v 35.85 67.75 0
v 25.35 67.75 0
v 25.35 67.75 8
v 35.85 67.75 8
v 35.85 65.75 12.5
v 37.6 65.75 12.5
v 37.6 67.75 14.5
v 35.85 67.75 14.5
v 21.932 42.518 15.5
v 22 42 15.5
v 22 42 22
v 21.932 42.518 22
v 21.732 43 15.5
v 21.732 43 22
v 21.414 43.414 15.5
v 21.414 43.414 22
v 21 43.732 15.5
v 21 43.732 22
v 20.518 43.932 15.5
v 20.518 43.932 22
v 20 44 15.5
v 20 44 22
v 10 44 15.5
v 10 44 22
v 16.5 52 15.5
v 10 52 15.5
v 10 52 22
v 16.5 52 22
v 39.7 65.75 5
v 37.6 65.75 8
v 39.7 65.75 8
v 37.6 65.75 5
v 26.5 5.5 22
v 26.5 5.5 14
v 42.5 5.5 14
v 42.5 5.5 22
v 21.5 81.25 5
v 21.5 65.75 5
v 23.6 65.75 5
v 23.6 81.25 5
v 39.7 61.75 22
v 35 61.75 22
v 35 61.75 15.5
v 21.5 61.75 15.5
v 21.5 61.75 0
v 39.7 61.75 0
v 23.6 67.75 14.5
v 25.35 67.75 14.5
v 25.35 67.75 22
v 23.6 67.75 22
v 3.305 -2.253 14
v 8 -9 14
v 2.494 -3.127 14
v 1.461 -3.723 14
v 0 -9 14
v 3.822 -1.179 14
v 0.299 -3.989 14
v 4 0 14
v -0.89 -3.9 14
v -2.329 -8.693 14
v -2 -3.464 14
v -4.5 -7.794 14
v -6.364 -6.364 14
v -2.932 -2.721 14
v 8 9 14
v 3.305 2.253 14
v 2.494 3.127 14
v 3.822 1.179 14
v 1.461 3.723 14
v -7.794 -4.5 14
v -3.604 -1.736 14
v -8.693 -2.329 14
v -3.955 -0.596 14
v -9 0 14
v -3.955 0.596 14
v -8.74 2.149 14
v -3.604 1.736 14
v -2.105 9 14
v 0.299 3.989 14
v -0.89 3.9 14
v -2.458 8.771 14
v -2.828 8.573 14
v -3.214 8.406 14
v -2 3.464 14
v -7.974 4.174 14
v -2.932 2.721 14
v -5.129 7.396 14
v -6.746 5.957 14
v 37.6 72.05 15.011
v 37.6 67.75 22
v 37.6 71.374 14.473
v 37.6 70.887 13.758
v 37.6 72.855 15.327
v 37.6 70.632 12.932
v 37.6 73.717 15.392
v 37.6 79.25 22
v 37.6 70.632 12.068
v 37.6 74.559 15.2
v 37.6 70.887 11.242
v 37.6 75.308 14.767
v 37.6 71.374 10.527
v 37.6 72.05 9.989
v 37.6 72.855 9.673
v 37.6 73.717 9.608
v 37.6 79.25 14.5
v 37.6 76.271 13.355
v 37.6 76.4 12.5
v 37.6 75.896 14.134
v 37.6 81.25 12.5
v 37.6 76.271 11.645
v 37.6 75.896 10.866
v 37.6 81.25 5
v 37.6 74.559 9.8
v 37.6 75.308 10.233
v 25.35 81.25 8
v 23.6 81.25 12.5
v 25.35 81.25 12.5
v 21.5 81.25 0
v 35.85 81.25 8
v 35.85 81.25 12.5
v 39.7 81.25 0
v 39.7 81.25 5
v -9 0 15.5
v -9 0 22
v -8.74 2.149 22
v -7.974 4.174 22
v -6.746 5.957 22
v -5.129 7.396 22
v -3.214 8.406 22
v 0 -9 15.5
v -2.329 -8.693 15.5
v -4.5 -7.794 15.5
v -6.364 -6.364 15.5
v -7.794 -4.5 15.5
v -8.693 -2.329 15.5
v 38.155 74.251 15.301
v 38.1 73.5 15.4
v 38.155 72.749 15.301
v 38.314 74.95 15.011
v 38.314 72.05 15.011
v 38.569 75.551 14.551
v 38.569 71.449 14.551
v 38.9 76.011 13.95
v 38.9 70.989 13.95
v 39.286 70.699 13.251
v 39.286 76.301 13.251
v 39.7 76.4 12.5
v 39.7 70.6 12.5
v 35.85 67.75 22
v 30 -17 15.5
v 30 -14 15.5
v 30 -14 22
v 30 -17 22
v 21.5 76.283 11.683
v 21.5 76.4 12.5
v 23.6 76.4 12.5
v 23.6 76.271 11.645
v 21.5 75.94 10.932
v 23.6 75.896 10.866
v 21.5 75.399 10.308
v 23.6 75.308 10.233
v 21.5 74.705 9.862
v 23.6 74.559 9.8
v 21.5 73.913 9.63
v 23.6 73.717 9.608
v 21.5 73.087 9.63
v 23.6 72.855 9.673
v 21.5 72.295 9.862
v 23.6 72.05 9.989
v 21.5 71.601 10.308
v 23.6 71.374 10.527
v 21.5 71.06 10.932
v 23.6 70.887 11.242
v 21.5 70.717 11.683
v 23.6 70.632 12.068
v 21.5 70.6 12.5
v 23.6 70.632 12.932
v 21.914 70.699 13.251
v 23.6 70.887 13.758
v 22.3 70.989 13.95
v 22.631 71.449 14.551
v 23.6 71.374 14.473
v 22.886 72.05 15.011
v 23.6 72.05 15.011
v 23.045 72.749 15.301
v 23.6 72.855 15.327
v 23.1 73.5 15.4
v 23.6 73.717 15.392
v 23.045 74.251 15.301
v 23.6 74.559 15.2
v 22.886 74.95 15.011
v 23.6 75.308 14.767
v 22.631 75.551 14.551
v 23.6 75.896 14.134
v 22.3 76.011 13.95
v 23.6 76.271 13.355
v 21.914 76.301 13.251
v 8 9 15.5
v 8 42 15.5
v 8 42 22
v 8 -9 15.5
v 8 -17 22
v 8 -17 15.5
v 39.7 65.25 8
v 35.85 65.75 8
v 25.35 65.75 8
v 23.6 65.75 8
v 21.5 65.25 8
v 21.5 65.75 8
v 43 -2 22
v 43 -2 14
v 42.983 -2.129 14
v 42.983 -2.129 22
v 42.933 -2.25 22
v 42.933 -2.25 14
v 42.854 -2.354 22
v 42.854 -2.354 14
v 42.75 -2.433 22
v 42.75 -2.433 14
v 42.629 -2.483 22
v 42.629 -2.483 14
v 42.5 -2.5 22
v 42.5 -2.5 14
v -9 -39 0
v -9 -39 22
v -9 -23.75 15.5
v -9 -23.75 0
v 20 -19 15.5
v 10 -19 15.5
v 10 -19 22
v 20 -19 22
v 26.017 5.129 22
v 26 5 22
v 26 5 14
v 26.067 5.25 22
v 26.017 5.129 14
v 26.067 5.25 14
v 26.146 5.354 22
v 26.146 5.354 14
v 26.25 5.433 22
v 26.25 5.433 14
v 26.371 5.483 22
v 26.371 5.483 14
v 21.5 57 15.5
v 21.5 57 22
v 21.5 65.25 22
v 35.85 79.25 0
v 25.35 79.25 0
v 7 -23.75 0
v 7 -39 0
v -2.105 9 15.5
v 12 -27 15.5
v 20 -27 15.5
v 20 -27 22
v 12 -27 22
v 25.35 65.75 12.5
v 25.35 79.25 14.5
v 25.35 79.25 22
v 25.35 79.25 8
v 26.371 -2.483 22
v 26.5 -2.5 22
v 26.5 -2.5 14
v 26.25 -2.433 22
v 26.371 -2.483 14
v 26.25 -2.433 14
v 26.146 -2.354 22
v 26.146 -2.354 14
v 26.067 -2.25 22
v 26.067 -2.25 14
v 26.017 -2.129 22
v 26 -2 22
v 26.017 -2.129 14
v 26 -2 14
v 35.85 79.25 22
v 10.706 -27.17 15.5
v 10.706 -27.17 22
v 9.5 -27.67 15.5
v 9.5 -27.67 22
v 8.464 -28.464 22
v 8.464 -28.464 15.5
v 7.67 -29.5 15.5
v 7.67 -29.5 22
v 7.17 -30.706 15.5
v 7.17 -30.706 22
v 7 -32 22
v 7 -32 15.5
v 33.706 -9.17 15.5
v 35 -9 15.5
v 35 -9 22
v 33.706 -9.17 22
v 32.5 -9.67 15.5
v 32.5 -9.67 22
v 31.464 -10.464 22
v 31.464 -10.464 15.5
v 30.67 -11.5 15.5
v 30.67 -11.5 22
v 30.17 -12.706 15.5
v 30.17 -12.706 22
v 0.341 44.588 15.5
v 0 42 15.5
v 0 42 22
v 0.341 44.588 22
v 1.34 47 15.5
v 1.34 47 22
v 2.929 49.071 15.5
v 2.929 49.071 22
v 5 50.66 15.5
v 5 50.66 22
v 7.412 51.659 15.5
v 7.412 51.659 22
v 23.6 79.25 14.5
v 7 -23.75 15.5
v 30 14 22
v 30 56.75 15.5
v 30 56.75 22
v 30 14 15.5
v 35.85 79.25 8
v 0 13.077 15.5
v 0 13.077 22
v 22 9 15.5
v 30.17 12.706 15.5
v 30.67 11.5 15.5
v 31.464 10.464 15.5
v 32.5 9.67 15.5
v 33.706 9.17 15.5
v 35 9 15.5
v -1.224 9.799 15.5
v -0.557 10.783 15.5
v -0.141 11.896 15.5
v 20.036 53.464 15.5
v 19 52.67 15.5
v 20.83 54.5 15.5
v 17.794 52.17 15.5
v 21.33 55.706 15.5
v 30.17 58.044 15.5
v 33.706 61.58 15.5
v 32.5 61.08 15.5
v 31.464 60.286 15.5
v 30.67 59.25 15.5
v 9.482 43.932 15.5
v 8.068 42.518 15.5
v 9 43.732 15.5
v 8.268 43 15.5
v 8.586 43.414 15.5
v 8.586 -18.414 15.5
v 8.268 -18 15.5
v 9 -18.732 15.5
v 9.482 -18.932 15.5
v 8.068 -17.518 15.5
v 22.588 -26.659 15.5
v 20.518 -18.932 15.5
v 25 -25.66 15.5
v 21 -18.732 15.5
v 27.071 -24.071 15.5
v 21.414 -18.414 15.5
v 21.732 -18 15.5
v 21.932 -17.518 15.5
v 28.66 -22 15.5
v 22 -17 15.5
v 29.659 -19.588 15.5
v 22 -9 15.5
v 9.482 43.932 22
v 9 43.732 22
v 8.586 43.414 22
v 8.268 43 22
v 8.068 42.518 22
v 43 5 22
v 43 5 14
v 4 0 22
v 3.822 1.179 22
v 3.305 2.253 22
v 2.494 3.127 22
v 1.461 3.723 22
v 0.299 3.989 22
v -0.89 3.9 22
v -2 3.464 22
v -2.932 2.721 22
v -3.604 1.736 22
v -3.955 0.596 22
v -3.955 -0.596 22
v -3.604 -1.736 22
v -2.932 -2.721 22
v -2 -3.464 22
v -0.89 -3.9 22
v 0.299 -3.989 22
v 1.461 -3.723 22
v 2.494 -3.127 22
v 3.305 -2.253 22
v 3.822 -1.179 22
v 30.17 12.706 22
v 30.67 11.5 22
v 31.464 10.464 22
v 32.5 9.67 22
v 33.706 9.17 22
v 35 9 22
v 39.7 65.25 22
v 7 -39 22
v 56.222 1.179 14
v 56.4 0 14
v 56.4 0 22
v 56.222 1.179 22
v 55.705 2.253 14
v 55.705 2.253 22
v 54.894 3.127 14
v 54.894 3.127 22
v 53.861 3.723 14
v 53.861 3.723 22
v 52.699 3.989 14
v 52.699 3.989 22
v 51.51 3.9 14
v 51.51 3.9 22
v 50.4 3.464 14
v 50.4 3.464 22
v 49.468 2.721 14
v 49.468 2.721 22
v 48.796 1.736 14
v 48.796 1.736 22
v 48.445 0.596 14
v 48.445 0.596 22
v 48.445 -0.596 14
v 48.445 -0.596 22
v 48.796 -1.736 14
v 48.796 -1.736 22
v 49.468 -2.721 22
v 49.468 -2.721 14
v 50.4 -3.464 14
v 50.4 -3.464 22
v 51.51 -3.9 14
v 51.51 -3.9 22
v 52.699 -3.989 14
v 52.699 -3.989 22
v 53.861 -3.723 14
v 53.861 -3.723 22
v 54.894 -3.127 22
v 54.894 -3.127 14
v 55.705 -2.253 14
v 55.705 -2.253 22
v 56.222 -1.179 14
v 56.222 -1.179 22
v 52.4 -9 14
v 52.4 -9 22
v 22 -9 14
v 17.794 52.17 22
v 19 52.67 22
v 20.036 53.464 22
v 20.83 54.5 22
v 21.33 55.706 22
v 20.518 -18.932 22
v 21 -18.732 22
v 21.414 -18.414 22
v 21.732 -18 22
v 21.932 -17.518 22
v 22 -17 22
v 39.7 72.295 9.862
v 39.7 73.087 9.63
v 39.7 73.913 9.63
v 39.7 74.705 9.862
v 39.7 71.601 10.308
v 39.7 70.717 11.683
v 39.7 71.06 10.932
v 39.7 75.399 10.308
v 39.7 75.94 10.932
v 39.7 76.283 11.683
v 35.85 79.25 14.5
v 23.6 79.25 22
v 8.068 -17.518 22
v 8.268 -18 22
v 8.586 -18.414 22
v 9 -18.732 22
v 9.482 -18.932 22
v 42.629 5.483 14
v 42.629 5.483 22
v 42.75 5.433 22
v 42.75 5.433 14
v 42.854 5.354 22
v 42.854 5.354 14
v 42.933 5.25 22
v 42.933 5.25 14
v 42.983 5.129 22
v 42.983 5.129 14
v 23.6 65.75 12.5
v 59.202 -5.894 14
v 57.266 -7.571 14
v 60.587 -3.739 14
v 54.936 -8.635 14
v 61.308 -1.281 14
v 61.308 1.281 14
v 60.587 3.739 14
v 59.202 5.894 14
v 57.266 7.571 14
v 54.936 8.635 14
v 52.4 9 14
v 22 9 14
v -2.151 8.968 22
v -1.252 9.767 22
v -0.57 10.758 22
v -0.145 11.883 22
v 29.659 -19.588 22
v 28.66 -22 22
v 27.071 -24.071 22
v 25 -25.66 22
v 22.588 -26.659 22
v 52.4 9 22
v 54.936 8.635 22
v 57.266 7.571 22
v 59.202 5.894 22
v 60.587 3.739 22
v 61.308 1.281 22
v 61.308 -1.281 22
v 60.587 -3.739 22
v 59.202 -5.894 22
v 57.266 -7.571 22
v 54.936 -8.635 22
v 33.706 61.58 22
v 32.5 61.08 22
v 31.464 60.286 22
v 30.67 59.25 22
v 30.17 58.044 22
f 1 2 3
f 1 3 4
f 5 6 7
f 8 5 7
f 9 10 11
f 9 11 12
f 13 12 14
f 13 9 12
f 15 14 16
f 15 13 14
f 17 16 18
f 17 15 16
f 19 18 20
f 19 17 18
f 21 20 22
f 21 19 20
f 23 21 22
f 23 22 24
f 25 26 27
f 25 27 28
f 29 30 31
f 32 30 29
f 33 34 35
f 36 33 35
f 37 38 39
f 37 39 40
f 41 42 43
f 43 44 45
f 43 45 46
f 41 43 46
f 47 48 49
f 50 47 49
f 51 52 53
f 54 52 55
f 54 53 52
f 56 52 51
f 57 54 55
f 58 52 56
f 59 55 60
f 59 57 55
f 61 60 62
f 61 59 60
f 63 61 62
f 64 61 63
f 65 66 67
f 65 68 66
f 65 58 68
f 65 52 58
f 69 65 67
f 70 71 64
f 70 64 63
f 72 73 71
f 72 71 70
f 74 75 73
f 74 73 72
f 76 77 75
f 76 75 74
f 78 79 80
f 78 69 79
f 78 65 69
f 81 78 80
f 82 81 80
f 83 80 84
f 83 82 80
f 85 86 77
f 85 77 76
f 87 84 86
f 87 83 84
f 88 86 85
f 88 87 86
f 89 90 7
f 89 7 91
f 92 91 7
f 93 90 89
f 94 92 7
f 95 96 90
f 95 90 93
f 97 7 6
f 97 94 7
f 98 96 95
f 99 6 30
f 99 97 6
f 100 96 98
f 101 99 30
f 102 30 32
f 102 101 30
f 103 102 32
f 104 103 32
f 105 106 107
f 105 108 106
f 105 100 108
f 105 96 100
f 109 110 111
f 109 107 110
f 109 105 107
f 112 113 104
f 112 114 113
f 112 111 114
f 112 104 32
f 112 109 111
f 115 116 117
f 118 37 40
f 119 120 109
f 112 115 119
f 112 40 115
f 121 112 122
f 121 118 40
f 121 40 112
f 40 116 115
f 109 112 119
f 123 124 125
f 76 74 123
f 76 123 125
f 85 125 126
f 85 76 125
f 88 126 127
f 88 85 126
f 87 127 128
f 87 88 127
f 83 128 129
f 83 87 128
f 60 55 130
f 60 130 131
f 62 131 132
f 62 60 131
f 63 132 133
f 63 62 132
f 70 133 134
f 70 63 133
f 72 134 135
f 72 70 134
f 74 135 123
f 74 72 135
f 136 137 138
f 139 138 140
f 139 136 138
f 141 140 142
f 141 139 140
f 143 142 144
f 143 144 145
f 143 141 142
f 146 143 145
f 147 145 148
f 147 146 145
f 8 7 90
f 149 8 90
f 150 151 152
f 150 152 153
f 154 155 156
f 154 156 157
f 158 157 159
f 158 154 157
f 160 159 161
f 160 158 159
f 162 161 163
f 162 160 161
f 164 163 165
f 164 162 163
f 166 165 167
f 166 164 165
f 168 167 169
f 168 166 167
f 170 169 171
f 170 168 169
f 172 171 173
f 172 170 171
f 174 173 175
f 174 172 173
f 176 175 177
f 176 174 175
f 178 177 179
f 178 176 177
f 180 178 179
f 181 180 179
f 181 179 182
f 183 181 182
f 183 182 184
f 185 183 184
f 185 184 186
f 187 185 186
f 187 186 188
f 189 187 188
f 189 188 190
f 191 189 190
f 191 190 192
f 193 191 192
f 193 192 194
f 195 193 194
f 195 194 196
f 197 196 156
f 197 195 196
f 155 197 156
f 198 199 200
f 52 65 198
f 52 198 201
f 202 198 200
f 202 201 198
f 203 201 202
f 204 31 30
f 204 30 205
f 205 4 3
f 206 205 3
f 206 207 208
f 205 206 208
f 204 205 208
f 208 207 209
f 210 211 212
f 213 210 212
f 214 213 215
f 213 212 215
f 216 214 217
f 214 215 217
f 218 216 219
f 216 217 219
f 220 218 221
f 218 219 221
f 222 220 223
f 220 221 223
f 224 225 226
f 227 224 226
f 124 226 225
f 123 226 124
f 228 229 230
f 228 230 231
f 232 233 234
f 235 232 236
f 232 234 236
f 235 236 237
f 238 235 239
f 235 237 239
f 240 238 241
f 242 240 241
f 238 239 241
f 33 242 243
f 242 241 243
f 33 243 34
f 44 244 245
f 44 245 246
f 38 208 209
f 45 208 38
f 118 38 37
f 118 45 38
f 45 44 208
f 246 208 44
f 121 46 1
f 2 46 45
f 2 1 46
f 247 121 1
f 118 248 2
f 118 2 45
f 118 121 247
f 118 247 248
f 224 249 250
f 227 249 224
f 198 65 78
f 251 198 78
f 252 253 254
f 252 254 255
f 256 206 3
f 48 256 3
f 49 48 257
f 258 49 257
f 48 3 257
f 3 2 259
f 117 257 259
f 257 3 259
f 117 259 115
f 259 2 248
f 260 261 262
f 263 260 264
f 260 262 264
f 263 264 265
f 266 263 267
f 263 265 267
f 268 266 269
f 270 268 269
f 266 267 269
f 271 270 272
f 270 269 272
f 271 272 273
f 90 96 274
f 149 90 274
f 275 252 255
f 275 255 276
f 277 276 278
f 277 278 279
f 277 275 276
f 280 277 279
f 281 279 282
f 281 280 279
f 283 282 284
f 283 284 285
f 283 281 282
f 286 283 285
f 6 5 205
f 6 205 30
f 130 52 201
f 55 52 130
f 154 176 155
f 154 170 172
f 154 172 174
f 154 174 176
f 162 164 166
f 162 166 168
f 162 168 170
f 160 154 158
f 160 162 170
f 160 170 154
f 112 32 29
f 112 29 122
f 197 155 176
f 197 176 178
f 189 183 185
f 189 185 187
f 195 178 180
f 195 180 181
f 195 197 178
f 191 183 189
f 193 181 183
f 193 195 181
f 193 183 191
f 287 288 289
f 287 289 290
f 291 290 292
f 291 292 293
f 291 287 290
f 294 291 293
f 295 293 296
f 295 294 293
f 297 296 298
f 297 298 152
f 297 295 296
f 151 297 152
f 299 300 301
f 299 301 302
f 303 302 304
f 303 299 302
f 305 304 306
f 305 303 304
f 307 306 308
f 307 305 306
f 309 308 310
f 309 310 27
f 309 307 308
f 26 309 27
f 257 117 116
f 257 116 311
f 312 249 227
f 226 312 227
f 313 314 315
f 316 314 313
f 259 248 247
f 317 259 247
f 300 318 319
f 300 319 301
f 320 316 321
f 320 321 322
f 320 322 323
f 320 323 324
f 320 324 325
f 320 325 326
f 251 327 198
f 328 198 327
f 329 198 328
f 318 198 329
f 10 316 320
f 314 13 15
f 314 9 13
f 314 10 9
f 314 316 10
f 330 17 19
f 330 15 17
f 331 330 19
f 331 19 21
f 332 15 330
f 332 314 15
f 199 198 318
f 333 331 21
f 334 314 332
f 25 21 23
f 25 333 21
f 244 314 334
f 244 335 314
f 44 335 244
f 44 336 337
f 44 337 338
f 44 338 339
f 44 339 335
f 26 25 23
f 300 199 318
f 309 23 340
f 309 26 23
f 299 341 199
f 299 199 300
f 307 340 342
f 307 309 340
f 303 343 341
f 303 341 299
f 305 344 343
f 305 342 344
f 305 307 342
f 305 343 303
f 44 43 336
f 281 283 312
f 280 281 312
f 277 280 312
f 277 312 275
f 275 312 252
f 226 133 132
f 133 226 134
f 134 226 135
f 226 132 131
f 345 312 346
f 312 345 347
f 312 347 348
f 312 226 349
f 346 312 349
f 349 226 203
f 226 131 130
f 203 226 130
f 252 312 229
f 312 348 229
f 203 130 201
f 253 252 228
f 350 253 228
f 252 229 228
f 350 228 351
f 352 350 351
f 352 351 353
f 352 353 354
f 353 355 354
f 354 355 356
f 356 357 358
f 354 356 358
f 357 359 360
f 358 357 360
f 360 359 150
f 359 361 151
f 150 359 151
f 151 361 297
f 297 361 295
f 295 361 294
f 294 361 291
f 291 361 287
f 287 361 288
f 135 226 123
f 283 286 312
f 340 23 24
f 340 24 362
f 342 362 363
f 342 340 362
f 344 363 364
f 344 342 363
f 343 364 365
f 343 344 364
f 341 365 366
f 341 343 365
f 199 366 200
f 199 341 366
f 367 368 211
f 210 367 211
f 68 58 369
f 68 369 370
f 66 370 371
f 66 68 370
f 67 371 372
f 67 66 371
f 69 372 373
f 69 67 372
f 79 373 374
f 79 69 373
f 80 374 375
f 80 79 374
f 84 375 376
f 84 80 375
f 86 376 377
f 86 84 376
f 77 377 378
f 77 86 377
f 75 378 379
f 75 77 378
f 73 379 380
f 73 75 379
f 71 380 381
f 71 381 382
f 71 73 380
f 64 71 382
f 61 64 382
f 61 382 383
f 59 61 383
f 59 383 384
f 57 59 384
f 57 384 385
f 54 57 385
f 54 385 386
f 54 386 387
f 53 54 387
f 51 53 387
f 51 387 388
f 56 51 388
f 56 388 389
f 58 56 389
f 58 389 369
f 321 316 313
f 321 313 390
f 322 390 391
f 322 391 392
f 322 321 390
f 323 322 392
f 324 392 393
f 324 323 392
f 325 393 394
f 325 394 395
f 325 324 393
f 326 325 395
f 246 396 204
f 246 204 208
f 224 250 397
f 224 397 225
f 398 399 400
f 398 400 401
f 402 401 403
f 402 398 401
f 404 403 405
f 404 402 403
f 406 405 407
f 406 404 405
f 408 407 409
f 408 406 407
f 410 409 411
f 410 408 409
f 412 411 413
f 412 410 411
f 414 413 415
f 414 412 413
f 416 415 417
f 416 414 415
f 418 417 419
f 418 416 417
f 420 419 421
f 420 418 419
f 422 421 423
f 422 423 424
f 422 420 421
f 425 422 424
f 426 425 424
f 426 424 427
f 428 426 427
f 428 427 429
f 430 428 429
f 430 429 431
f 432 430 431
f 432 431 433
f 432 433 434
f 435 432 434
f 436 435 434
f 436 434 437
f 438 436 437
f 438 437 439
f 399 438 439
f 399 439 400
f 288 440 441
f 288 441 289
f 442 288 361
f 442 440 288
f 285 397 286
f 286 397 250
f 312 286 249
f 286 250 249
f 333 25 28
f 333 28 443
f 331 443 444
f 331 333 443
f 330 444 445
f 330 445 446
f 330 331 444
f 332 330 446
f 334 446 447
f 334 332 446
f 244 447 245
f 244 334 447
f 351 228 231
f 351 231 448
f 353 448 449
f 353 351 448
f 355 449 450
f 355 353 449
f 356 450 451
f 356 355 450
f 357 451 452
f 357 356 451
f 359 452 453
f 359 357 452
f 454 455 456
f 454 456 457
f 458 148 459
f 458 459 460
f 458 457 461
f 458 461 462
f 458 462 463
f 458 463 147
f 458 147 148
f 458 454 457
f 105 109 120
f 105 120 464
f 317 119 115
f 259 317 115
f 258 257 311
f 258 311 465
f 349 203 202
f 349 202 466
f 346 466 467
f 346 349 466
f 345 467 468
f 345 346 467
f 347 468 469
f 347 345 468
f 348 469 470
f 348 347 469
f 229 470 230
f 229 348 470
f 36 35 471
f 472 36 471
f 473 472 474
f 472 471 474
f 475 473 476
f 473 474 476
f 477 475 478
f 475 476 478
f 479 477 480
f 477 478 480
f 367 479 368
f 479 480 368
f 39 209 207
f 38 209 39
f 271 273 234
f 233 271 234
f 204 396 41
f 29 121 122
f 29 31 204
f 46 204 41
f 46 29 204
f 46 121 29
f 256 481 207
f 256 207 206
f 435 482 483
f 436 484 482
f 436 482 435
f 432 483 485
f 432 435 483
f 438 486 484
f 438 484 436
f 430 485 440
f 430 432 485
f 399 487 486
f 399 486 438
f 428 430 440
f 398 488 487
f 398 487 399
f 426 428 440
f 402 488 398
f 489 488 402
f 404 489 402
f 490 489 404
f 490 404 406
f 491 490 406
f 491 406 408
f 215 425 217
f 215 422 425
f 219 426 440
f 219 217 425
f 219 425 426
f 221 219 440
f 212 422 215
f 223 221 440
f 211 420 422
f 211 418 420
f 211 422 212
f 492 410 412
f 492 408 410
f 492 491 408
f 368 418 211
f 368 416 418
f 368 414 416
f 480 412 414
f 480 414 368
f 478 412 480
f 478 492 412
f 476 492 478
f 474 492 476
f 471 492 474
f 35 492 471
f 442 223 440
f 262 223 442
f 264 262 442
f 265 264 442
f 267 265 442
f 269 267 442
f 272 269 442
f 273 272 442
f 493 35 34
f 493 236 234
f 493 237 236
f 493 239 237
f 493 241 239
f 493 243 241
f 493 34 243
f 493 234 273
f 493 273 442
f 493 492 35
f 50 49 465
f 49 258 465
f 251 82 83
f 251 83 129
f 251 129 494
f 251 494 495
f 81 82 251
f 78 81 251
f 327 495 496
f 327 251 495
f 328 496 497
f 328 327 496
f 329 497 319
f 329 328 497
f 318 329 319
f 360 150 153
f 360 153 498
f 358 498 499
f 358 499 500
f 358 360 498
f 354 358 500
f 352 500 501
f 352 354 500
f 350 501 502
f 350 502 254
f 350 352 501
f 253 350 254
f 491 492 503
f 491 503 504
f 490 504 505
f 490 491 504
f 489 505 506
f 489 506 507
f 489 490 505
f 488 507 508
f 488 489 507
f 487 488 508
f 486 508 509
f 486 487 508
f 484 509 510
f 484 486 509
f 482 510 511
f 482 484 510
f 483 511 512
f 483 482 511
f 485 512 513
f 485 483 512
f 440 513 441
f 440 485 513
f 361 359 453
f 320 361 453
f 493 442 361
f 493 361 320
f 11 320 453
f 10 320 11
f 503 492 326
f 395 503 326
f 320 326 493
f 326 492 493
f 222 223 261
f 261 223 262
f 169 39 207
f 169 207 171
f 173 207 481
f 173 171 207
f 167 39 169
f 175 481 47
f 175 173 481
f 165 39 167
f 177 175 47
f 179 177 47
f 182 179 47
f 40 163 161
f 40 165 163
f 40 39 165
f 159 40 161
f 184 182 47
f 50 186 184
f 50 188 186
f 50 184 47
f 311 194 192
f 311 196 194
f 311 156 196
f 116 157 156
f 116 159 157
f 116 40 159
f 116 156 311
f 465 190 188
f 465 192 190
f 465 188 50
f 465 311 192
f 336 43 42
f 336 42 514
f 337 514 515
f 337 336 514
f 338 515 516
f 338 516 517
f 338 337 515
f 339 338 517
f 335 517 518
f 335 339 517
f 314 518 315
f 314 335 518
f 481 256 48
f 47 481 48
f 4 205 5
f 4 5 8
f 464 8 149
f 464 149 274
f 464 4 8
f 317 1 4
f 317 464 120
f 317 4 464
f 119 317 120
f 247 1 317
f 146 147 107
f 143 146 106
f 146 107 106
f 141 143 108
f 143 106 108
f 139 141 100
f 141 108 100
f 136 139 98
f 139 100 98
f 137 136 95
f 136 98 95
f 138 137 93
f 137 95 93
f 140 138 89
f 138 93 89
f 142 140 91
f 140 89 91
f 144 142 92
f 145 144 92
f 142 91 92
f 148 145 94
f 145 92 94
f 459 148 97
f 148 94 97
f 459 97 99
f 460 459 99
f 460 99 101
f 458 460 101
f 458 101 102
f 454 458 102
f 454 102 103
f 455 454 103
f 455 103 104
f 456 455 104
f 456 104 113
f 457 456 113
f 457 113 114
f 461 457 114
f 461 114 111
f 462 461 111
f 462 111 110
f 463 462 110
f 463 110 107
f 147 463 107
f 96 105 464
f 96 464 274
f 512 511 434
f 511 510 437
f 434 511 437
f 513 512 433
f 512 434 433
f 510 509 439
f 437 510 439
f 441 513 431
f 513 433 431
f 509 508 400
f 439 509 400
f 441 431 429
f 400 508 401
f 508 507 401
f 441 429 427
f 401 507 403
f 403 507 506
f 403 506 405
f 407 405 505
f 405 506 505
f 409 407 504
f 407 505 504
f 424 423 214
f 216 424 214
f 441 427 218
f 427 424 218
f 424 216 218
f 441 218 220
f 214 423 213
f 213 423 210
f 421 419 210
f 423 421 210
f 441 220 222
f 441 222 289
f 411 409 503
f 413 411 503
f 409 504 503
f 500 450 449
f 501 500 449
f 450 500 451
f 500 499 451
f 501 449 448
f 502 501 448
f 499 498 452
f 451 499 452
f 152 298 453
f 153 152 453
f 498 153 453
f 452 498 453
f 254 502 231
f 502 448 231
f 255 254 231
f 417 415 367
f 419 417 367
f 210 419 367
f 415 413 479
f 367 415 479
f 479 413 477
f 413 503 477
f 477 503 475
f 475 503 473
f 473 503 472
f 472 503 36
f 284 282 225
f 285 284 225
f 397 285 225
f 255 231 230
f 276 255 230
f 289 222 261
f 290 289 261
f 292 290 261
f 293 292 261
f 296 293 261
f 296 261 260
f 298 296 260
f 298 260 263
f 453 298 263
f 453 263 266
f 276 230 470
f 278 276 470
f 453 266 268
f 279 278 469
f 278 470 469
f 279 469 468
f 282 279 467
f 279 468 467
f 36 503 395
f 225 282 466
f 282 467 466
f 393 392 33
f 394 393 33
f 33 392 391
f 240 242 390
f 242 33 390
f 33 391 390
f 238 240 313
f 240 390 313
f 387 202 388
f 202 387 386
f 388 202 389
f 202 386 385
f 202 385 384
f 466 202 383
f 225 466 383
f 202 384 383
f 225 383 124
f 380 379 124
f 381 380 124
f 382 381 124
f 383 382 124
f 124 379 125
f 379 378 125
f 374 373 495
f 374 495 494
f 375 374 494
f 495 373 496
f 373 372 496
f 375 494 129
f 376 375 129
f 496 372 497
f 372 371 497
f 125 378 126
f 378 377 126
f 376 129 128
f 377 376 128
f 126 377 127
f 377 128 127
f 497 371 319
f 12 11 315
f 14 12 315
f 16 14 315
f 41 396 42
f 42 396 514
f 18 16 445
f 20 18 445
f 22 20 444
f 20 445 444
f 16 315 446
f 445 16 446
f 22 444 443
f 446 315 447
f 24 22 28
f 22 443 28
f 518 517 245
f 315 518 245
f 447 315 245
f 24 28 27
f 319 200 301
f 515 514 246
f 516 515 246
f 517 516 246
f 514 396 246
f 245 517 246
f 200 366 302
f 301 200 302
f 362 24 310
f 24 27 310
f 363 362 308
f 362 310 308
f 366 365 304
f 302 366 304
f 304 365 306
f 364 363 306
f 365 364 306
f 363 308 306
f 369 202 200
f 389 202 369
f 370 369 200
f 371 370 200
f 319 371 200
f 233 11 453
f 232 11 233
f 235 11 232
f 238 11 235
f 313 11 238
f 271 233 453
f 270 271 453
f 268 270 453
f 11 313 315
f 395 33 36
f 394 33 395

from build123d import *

# Parameters (mm, degrees)
SKETCH1_R           = 4
SKETCH1_W           = 10.5
SKETCH1_H           = 11.5
BOSS_EXTRUDE1_DEPTH = 22
CUT_EXTRUDE1_DEPTH  = 14
SKETCH5_W           = 17
SKETCH5_H           = 15.5
SKETCH5_R           = 2.9
CUT_EXTRUDE2_DEPTH  = 2.1
CUT_EXTRUDE3_START  = -2.1
SKETCH4_W           = 17
SKETCH4_H           = 15.5
SKETCH4_R           = 2.9
CUT_EXTRUDE3_DEPTH  = 2.1
CUT_EXTRUDE4_START  = -16.1
CUT_EXTRUDE4_DEPTH  = 14
CUT_EXTRUDE5_DEPTH  = 14
CUT_EXTRUDE6_REACH  = 138.799
CUT_EXTRUDE8_DEPTH  = 1.5


with BuildPart() as part:
    # Sketch1 → Boss-Extrude1 (new body)
    with BuildSketch(Plane.XY):
        with BuildLine():
            Line((0, 13.076696831), (0, 42))
            ThreePointArc((0, 42), (2.928932188, 49.071067812), (10, 52))
            Line((10, 52), (16.5, 52))
            ThreePointArc((16.5, 52), (20.035533906, 53.464466094), (21.5, 57))
            Line((21.5, 57), (21.5, 81.25))
            Line((21.5, 81.25), (39.7, 81.25))
            Line((39.7, 81.25), (39.7, 61.75))
            Line((39.7, 61.75), (35, 61.75))
            ThreePointArc((35, 61.75), (31.464466094, 60.285533906), (30, 56.75))
            Line((30, 56.75), (30, 14))
            ThreePointArc((30, 14), (31.464466094, 10.464466094), (35, 9))
            Line((35, 9), (52.4, 9))
            ThreePointArc((52.4, 9), (61.4, 0), (52.4, -9))
            Line((52.4, -9), (35, -9))
            ThreePointArc((35, -9), (31.464466094, -10.464466094), (30, -14))
            Line((30, -14), (30, -17))
            ThreePointArc((30, -17), (27.071067812, -24.071067812), (20, -27))
            Line((20, -27), (12, -27))
            ThreePointArc((12, -27), (8.464466094, -28.464466094), (7, -32))
            Line((7, -32), (7, -39))
            Line((7, -39), (-9, -39))
            Line((-9, -39), (-9, 0))
            ThreePointArc((-9, 0), (-7.413790239, 5.102520386), (-3.214285714, 8.406447963))
            ThreePointArc((-3.214285714, 8.406447963), (-0.881227645, 10.241963283), (0, 13.076696831))
        make_face()
        Circle(SKETCH1_R, mode=Mode.SUBTRACT)
        with Locations((52.4, 0)):
            Circle(SKETCH1_R, mode=Mode.SUBTRACT)
        with BuildLine():
            Line((42.5, -2.5), (26.5, -2.5))
            ThreePointArc((26.5, -2.5), (26.146446609, -2.353553391), (26, -2))
            Line((26, -2), (26, 5))
            ThreePointArc((26, 5), (26.146446609, 5.353553391), (26.5, 5.5))
            Line((26.5, 5.5), (42.5, 5.5))
            ThreePointArc((42.5, 5.5), (42.853553391, 5.353553391), (43, 5))
            Line((43, 5), (43, -2))
            ThreePointArc((43, -2), (42.853553391, -2.353553391), (42.5, -2.5))
        make_face(mode=Mode.SUBTRACT)
        with BuildLine():
            Line((8, 42), (8, -17))
            ThreePointArc((8, -17), (8.585786438, -18.414213562), (10, -19))
            Line((10, -19), (20, -19))
            ThreePointArc((20, -19), (21.414213562, -18.414213562), (22, -17))
            Line((22, -17), (22, 42))
            ThreePointArc((22, 42), (21.414213562, 43.414213562), (20, 44))
            Line((20, 44), (10, 44))
            ThreePointArc((10, 44), (8.585786438, 43.414213562), (8, 42))
        make_face(mode=Mode.SUBTRACT)
        with Locations((30.6, 73.5)):
            Rectangle(SKETCH1_W, SKETCH1_H, mode=Mode.SUBTRACT)
    extrude(amount=BOSS_EXTRUDE1_DEPTH)

    # Sketch3 → Cut-Extrude1 (cut)
    with BuildSketch(Plane(origin=(0, 0, 0), x_dir=(-1, 0, 0), z_dir=(0, 0, -1))):
        with BuildLine():
            Line((-21.5, 61.75), (-35, 61.75))
            ThreePointArc((-35, 61.75), (-31.464466094, 60.285533906), (-30, 56.75))
            Line((-30, 56.75), (-30, 14))
            ThreePointArc((-30, 14), (-31.464466094, 10.464466094), (-35, 9))
            Line((-35, 9), (-52.4, 9))
            ThreePointArc((-52.4, 9), (-61.4, 0), (-52.4, -9))
            Line((-52.4, -9), (-35, -9))
            ThreePointArc((-35, -9), (-31.464466094, -10.464466094), (-30, -14))
            Line((-30, -14), (-30, -17))
            ThreePointArc((-30, -17), (-27.071067812, -24.071067812), (-20, -27))
            Line((-20, -27), (-12, -27))
            ThreePointArc((-12, -27), (-8.464466094, -28.464466094), (-7, -32))
            Line((-7, -32), (-7, -23.75))
            Line((-7, -23.75), (9, -23.75))
            Line((9, -23.75), (9, 0))
            ThreePointArc((9, 0), (7.413790239, 5.102520386), (3.214285714, 8.406447963))
            ThreePointArc((3.214285714, 8.406447963), (0.881227645, 10.241963283), (0, 13.076696831))
            Line((0, 13.076696831), (0, 42))
            ThreePointArc((0, 42), (-2.928932188, 49.071067812), (-10, 52))
            Line((-10, 52), (-16.5, 52))
            ThreePointArc((-16.5, 52), (-20.035533906, 53.464466094), (-21.5, 57))
            Line((-21.5, 57), (-21.5, 61.75))
        make_face()
    extrude(amount=-CUT_EXTRUDE1_DEPTH, mode=Mode.SUBTRACT)

    # Sketch5 → Cut-Extrude2 (cut)
    with BuildSketch(Plane.ZY.offset(-21.5)):
        with Locations((13.5, 73.5)):
            Rectangle(SKETCH5_W, SKETCH5_H)
        with Locations(Location((12.5, 73.5, 0), (0, 0, 90))):
            Circle(SKETCH5_R, mode=Mode.SUBTRACT)
    extrude(amount=-CUT_EXTRUDE2_DEPTH, mode=Mode.SUBTRACT)

    # Sketch4 → Cut-Extrude3 (cut)
    with BuildSketch(Plane(origin=(39.7, 0, 0), x_dir=(0, 0, -1), z_dir=(1, 0, 0)).offset(CUT_EXTRUDE3_START)):
        with Locations((-13.5, 73.5)):
            Rectangle(SKETCH4_W, SKETCH4_H)
        with Locations(Location((-12.5, 73.5, 0), (0, 0, 90))):
            Circle(SKETCH4_R, mode=Mode.SUBTRACT)
    extrude(amount=CUT_EXTRUDE3_DEPTH, mode=Mode.SUBTRACT)

    # Sketch6 → Cut-Extrude4 (cut)
    with BuildSketch(Plane.ZY.offset(-21.5).offset(CUT_EXTRUDE4_START)):
        Polygon((12.5, 81.25), (14.5, 79.25), (22, 79.25), (22, 81.25), align=None)
        Polygon((12.5, 65.75), (14.5, 67.75), (22, 67.75), (22, 65.75), align=None)
    extrude(amount=CUT_EXTRUDE4_DEPTH, mode=Mode.SUBTRACT)

    # Sketch7 → Cut-Extrude5 (cut)
    with BuildSketch(Plane.XY.offset(22)):
        Polygon((25.35, 81.25), (35.85, 81.25), (35.85, 65.75), (39.7, 65.75), (39.7, 65.25), (21.5, 65.25), (21.5, 65.75), (25.35, 65.75), align=None)
    extrude(amount=-CUT_EXTRUDE5_DEPTH, mode=Mode.SUBTRACT)

    # Cut-Extrude6: up to this face of the body (flat: up to its plane)
    cut_extrude6_end = Plane(part.part.faces().sort_by_distance((22.55, 65.75, 6.5))[0])
    # Sketch8 → Cut-Extrude6 (cut, up to the picked face)
    with BuildSketch(Plane(origin=(0, 81.25, 0), x_dir=(1, 0, 0), z_dir=(0, 1, 0)), mode=Mode.PRIVATE) as cut_extrude6_sk1:
        Polygon((21.5, -12.5), (23.1, -15.4), (21.5, -15.4), align=None)
    cut_extrude6_tool1 = split(extrude(cut_extrude6_sk1.sketch, amount=-CUT_EXTRUDE6_REACH, mode=Mode.PRIVATE), bisect_by=cut_extrude6_end, keep=Keep.BOTH, mode=Mode.PRIVATE)
    # Sketch8 → Cut-Extrude6 (cut, up to the picked face)
    with BuildSketch(Plane(origin=(0, 81.25, 0), x_dir=(1, 0, 0), z_dir=(0, 1, 0)), mode=Mode.PRIVATE) as cut_extrude6_sk2:
        Polygon((39.7, -15.4), (38.1, -15.4), (39.7, -12.5), align=None)
    cut_extrude6_tool2 = split(extrude(cut_extrude6_sk2.sketch, amount=-CUT_EXTRUDE6_REACH, mode=Mode.PRIVATE), bisect_by=cut_extrude6_end, keep=Keep.BOTH, mode=Mode.PRIVATE)
    add(cut_extrude6_tool1.solids().sort_by(Axis((22.033333, 81.25, 14.433333), (0, -1, 0)))[0], mode=Mode.SUBTRACT)
    add(cut_extrude6_tool2.solids().sort_by(Axis((39.166667, 81.25, 14.433333), (0, -1, 0)))[0], mode=Mode.SUBTRACT)

    # Sketch10 → Cut-Extrude8 (cut)
    with BuildSketch(Plane(origin=(0, 0, 14), x_dir=(-1, 0, 0), z_dir=(0, 0, -1))):
        with BuildLine():
            Line((-35, 9), (2.105083257, 9))
            ThreePointArc((2.105083257, 9), (0.557332799, 10.782637515), (0, 13.076696831))
            Line((0, 13.076696831), (0, 42))
            ThreePointArc((0, 42), (-2.928932188, 49.071067812), (-10, 52))
            Line((-10, 52), (-16.5, 52))
            ThreePointArc((-16.5, 52), (-20.035533906, 53.464466094), (-21.5, 57))
            Line((-21.5, 57), (-21.5, 61.75))
            Line((-21.5, 61.75), (-35, 61.75))
            ThreePointArc((-35, 61.75), (-31.464466094, 60.285533906), (-30, 56.75))
            Line((-30, 56.75), (-30, 14))
            ThreePointArc((-30, 14), (-31.464466094, 10.464466094), (-35, 9))
        make_face()
        with BuildLine():
            Line((-35, -9), (0, -9))
            ThreePointArc((0, -9), (6.363961031, -6.363961031), (9, 0))
            Line((9, 0), (9, -23.75))
            Line((9, -23.75), (-7, -23.75))
            Line((-7, -23.75), (-7, -32))
            ThreePointArc((-7, -32), (-8.464466094, -28.464466094), (-12, -27))
            Line((-12, -27), (-20, -27))
            ThreePointArc((-20, -27), (-27.071067812, -24.071067812), (-30, -17))
            Line((-30, -17), (-30, -14))
            ThreePointArc((-30, -14), (-31.464466094, -10.464466094), (-35, -9))
        make_face()
    extrude(amount=-CUT_EXTRUDE8_DEPTH, mode=Mode.SUBTRACT)


solid = part.part
